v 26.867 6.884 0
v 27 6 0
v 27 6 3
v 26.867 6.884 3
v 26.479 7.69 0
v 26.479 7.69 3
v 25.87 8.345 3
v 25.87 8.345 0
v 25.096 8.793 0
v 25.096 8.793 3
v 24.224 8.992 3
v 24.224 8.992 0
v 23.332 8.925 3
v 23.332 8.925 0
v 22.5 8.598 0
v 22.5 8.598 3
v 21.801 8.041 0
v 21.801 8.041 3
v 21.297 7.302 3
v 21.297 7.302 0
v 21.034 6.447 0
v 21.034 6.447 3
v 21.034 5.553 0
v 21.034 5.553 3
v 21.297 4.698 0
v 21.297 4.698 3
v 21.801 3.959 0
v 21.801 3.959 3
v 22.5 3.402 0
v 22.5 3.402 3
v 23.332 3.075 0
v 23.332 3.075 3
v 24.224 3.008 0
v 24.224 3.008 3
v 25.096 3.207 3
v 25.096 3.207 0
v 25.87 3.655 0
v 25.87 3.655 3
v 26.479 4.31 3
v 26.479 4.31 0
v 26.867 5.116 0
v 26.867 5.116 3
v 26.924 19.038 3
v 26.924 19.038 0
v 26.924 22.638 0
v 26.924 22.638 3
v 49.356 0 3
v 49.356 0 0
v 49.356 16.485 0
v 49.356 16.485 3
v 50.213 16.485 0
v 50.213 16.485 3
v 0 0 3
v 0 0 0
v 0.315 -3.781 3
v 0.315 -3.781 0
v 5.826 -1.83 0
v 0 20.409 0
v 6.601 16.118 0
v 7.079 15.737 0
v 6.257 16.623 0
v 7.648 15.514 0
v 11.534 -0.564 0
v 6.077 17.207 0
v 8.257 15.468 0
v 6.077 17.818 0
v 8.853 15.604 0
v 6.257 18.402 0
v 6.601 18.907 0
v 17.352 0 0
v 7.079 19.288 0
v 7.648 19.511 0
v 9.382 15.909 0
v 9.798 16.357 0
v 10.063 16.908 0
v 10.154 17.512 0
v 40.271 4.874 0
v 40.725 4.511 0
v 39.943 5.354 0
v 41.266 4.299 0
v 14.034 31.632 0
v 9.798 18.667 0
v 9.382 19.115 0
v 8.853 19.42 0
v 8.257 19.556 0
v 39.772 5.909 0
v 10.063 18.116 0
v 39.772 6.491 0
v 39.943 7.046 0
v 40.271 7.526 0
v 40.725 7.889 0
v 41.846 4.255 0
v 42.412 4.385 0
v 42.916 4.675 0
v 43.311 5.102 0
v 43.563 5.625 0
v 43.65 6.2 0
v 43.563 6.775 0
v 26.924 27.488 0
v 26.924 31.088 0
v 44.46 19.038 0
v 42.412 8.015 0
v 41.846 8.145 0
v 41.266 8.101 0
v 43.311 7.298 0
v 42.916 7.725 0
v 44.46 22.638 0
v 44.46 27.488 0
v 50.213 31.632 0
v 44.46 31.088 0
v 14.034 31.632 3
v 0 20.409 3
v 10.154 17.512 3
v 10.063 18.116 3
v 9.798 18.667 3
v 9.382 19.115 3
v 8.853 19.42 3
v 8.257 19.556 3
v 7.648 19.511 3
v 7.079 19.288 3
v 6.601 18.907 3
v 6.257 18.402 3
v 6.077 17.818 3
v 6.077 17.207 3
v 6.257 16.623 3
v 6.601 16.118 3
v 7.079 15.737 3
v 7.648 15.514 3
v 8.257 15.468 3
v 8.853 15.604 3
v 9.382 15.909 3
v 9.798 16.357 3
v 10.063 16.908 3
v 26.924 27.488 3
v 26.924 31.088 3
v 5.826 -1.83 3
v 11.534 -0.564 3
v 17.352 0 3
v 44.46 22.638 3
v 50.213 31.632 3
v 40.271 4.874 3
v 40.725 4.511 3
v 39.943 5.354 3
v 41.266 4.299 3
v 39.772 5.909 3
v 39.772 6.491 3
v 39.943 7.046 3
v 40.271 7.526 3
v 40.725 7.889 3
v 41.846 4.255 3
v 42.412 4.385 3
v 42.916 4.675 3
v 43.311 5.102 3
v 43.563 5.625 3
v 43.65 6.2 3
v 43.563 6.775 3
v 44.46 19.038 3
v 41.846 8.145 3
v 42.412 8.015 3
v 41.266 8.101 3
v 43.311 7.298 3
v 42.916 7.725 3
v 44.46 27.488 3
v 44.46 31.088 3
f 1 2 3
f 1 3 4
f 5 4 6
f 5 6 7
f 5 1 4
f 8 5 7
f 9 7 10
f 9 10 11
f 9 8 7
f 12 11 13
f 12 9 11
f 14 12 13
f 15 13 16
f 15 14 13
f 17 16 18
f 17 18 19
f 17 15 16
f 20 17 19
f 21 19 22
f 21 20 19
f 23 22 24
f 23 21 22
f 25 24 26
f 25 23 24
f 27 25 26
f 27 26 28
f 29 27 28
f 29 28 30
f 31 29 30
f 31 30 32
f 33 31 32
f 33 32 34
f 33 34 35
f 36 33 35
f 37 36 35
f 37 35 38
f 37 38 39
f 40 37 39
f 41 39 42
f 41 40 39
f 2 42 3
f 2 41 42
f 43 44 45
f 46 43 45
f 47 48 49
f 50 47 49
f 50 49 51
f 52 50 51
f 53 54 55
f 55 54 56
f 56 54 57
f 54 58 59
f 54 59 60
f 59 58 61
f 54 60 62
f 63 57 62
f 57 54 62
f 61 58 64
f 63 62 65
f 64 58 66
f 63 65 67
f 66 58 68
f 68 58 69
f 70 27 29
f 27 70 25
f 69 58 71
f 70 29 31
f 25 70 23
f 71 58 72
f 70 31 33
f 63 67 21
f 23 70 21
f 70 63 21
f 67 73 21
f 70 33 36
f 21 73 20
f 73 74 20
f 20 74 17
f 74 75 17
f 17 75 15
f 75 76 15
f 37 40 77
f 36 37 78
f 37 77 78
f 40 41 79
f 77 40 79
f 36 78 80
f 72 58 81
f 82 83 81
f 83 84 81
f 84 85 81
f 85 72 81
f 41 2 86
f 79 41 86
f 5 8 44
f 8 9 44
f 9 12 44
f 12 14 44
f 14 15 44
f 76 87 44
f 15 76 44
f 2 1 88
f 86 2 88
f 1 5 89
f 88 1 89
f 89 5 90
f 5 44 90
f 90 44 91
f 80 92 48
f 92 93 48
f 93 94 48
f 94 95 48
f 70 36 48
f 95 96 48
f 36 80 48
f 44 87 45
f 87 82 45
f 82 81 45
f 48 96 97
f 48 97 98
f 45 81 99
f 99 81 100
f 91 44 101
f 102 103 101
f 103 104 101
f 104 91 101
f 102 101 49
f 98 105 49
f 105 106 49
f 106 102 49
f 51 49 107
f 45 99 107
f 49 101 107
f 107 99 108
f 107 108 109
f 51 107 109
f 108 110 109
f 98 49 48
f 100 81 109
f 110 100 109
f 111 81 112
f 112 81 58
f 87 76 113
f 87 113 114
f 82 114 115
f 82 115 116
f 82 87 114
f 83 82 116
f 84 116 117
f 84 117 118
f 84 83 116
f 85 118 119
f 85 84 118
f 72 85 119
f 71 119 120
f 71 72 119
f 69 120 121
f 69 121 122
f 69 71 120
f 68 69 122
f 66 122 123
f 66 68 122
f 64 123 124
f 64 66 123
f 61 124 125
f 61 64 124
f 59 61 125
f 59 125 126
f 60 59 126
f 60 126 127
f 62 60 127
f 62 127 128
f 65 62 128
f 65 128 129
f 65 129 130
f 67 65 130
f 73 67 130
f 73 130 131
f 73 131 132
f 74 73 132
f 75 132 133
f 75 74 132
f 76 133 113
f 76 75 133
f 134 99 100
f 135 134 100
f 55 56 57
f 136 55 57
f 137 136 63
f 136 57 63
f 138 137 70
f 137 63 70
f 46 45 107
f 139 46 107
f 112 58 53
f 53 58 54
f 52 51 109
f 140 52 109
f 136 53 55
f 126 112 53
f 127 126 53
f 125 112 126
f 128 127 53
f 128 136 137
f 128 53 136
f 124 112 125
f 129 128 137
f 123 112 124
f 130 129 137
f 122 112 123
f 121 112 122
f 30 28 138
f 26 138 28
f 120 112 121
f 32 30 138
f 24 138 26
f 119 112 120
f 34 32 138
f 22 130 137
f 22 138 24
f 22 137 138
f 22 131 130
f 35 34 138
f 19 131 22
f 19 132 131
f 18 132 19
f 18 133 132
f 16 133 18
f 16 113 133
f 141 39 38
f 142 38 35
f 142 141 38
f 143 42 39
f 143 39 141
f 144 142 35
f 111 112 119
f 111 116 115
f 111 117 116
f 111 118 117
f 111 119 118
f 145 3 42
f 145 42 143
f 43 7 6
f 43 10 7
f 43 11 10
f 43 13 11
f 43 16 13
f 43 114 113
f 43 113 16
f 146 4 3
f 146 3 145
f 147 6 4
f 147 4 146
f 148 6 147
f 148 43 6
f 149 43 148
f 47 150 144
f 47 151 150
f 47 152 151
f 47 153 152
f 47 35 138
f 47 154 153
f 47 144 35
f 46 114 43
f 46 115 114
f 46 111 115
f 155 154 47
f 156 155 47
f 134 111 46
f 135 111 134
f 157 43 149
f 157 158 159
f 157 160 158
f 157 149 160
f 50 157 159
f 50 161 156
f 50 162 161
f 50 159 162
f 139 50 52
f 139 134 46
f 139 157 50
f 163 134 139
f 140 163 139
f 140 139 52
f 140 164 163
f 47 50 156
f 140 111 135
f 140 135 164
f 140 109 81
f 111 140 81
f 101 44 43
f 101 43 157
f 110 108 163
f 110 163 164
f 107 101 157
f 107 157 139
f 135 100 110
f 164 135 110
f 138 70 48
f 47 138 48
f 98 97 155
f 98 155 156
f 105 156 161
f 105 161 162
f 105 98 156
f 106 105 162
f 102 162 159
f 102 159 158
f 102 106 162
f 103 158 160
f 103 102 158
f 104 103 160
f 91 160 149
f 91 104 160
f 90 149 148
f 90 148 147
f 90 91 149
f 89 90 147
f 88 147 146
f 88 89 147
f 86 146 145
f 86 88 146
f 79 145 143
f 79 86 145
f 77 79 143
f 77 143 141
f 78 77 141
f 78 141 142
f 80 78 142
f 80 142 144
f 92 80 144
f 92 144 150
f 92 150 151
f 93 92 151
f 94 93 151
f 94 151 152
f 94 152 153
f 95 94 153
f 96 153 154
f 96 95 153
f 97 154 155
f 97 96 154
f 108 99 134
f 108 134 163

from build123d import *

# Parameters (mm, degrees)
SKETCH_1_R      = 3
SKETCH_1_R_2    = 1.95
SKETCH_1_R_3    = 2.05
SKETCH_1_W      = 17.535566723
SKETCH_1_H      = 3.6
EXTRUDE_1_DEPTH = 3


with BuildPart() as part:
    # 스케치1 → 보스-돌출1 (new body)
    with BuildSketch(Plane.XY):
        with BuildLine():
            Line((14.033980913, 31.631973376), (0, 20.408728084))
            Line((0, 20.408728084), (0, 0))
            Line((0, 0), (0.315433782, -3.780966668))
            ThreePointArc((0.315433782, -3.780966668), (8.660717355, -1.110252043), (17.352311853, 0))
            Line((17.352311853, 0), (49.356011681, 0))
            Line((49.356011681, 0), (49.356011681, 16.484705835))
            Line((49.356011681, 16.484705835), (50.213133896, 16.484705835))
            Line((50.213133896, 16.484705835), (50.213133896, 31.631973376))
            Line((50.213133896, 31.631973376), (14.033980913, 31.631973376))
        make_face()
        with Locations((24, 6)):
            Circle(SKETCH_1_R, mode=Mode.SUBTRACT)
        with Locations((41.7, 6.2)):
            Circle(SKETCH_1_R_2, mode=Mode.SUBTRACT)
        with Locations((8.103885944, 17.512168243)):
            Circle(SKETCH_1_R_3, mode=Mode.SUBTRACT)
        with Locations((35.691910847, 29.288073102)):
            Rectangle(SKETCH_1_W, SKETCH_1_H, mode=Mode.SUBTRACT)
        with Locations((35.691910847, 20.838073102)):
            Rectangle(SKETCH_1_W, SKETCH_1_H, mode=Mode.SUBTRACT)
    extrude(amount=EXTRUDE_1_DEPTH)


solid = part.part
